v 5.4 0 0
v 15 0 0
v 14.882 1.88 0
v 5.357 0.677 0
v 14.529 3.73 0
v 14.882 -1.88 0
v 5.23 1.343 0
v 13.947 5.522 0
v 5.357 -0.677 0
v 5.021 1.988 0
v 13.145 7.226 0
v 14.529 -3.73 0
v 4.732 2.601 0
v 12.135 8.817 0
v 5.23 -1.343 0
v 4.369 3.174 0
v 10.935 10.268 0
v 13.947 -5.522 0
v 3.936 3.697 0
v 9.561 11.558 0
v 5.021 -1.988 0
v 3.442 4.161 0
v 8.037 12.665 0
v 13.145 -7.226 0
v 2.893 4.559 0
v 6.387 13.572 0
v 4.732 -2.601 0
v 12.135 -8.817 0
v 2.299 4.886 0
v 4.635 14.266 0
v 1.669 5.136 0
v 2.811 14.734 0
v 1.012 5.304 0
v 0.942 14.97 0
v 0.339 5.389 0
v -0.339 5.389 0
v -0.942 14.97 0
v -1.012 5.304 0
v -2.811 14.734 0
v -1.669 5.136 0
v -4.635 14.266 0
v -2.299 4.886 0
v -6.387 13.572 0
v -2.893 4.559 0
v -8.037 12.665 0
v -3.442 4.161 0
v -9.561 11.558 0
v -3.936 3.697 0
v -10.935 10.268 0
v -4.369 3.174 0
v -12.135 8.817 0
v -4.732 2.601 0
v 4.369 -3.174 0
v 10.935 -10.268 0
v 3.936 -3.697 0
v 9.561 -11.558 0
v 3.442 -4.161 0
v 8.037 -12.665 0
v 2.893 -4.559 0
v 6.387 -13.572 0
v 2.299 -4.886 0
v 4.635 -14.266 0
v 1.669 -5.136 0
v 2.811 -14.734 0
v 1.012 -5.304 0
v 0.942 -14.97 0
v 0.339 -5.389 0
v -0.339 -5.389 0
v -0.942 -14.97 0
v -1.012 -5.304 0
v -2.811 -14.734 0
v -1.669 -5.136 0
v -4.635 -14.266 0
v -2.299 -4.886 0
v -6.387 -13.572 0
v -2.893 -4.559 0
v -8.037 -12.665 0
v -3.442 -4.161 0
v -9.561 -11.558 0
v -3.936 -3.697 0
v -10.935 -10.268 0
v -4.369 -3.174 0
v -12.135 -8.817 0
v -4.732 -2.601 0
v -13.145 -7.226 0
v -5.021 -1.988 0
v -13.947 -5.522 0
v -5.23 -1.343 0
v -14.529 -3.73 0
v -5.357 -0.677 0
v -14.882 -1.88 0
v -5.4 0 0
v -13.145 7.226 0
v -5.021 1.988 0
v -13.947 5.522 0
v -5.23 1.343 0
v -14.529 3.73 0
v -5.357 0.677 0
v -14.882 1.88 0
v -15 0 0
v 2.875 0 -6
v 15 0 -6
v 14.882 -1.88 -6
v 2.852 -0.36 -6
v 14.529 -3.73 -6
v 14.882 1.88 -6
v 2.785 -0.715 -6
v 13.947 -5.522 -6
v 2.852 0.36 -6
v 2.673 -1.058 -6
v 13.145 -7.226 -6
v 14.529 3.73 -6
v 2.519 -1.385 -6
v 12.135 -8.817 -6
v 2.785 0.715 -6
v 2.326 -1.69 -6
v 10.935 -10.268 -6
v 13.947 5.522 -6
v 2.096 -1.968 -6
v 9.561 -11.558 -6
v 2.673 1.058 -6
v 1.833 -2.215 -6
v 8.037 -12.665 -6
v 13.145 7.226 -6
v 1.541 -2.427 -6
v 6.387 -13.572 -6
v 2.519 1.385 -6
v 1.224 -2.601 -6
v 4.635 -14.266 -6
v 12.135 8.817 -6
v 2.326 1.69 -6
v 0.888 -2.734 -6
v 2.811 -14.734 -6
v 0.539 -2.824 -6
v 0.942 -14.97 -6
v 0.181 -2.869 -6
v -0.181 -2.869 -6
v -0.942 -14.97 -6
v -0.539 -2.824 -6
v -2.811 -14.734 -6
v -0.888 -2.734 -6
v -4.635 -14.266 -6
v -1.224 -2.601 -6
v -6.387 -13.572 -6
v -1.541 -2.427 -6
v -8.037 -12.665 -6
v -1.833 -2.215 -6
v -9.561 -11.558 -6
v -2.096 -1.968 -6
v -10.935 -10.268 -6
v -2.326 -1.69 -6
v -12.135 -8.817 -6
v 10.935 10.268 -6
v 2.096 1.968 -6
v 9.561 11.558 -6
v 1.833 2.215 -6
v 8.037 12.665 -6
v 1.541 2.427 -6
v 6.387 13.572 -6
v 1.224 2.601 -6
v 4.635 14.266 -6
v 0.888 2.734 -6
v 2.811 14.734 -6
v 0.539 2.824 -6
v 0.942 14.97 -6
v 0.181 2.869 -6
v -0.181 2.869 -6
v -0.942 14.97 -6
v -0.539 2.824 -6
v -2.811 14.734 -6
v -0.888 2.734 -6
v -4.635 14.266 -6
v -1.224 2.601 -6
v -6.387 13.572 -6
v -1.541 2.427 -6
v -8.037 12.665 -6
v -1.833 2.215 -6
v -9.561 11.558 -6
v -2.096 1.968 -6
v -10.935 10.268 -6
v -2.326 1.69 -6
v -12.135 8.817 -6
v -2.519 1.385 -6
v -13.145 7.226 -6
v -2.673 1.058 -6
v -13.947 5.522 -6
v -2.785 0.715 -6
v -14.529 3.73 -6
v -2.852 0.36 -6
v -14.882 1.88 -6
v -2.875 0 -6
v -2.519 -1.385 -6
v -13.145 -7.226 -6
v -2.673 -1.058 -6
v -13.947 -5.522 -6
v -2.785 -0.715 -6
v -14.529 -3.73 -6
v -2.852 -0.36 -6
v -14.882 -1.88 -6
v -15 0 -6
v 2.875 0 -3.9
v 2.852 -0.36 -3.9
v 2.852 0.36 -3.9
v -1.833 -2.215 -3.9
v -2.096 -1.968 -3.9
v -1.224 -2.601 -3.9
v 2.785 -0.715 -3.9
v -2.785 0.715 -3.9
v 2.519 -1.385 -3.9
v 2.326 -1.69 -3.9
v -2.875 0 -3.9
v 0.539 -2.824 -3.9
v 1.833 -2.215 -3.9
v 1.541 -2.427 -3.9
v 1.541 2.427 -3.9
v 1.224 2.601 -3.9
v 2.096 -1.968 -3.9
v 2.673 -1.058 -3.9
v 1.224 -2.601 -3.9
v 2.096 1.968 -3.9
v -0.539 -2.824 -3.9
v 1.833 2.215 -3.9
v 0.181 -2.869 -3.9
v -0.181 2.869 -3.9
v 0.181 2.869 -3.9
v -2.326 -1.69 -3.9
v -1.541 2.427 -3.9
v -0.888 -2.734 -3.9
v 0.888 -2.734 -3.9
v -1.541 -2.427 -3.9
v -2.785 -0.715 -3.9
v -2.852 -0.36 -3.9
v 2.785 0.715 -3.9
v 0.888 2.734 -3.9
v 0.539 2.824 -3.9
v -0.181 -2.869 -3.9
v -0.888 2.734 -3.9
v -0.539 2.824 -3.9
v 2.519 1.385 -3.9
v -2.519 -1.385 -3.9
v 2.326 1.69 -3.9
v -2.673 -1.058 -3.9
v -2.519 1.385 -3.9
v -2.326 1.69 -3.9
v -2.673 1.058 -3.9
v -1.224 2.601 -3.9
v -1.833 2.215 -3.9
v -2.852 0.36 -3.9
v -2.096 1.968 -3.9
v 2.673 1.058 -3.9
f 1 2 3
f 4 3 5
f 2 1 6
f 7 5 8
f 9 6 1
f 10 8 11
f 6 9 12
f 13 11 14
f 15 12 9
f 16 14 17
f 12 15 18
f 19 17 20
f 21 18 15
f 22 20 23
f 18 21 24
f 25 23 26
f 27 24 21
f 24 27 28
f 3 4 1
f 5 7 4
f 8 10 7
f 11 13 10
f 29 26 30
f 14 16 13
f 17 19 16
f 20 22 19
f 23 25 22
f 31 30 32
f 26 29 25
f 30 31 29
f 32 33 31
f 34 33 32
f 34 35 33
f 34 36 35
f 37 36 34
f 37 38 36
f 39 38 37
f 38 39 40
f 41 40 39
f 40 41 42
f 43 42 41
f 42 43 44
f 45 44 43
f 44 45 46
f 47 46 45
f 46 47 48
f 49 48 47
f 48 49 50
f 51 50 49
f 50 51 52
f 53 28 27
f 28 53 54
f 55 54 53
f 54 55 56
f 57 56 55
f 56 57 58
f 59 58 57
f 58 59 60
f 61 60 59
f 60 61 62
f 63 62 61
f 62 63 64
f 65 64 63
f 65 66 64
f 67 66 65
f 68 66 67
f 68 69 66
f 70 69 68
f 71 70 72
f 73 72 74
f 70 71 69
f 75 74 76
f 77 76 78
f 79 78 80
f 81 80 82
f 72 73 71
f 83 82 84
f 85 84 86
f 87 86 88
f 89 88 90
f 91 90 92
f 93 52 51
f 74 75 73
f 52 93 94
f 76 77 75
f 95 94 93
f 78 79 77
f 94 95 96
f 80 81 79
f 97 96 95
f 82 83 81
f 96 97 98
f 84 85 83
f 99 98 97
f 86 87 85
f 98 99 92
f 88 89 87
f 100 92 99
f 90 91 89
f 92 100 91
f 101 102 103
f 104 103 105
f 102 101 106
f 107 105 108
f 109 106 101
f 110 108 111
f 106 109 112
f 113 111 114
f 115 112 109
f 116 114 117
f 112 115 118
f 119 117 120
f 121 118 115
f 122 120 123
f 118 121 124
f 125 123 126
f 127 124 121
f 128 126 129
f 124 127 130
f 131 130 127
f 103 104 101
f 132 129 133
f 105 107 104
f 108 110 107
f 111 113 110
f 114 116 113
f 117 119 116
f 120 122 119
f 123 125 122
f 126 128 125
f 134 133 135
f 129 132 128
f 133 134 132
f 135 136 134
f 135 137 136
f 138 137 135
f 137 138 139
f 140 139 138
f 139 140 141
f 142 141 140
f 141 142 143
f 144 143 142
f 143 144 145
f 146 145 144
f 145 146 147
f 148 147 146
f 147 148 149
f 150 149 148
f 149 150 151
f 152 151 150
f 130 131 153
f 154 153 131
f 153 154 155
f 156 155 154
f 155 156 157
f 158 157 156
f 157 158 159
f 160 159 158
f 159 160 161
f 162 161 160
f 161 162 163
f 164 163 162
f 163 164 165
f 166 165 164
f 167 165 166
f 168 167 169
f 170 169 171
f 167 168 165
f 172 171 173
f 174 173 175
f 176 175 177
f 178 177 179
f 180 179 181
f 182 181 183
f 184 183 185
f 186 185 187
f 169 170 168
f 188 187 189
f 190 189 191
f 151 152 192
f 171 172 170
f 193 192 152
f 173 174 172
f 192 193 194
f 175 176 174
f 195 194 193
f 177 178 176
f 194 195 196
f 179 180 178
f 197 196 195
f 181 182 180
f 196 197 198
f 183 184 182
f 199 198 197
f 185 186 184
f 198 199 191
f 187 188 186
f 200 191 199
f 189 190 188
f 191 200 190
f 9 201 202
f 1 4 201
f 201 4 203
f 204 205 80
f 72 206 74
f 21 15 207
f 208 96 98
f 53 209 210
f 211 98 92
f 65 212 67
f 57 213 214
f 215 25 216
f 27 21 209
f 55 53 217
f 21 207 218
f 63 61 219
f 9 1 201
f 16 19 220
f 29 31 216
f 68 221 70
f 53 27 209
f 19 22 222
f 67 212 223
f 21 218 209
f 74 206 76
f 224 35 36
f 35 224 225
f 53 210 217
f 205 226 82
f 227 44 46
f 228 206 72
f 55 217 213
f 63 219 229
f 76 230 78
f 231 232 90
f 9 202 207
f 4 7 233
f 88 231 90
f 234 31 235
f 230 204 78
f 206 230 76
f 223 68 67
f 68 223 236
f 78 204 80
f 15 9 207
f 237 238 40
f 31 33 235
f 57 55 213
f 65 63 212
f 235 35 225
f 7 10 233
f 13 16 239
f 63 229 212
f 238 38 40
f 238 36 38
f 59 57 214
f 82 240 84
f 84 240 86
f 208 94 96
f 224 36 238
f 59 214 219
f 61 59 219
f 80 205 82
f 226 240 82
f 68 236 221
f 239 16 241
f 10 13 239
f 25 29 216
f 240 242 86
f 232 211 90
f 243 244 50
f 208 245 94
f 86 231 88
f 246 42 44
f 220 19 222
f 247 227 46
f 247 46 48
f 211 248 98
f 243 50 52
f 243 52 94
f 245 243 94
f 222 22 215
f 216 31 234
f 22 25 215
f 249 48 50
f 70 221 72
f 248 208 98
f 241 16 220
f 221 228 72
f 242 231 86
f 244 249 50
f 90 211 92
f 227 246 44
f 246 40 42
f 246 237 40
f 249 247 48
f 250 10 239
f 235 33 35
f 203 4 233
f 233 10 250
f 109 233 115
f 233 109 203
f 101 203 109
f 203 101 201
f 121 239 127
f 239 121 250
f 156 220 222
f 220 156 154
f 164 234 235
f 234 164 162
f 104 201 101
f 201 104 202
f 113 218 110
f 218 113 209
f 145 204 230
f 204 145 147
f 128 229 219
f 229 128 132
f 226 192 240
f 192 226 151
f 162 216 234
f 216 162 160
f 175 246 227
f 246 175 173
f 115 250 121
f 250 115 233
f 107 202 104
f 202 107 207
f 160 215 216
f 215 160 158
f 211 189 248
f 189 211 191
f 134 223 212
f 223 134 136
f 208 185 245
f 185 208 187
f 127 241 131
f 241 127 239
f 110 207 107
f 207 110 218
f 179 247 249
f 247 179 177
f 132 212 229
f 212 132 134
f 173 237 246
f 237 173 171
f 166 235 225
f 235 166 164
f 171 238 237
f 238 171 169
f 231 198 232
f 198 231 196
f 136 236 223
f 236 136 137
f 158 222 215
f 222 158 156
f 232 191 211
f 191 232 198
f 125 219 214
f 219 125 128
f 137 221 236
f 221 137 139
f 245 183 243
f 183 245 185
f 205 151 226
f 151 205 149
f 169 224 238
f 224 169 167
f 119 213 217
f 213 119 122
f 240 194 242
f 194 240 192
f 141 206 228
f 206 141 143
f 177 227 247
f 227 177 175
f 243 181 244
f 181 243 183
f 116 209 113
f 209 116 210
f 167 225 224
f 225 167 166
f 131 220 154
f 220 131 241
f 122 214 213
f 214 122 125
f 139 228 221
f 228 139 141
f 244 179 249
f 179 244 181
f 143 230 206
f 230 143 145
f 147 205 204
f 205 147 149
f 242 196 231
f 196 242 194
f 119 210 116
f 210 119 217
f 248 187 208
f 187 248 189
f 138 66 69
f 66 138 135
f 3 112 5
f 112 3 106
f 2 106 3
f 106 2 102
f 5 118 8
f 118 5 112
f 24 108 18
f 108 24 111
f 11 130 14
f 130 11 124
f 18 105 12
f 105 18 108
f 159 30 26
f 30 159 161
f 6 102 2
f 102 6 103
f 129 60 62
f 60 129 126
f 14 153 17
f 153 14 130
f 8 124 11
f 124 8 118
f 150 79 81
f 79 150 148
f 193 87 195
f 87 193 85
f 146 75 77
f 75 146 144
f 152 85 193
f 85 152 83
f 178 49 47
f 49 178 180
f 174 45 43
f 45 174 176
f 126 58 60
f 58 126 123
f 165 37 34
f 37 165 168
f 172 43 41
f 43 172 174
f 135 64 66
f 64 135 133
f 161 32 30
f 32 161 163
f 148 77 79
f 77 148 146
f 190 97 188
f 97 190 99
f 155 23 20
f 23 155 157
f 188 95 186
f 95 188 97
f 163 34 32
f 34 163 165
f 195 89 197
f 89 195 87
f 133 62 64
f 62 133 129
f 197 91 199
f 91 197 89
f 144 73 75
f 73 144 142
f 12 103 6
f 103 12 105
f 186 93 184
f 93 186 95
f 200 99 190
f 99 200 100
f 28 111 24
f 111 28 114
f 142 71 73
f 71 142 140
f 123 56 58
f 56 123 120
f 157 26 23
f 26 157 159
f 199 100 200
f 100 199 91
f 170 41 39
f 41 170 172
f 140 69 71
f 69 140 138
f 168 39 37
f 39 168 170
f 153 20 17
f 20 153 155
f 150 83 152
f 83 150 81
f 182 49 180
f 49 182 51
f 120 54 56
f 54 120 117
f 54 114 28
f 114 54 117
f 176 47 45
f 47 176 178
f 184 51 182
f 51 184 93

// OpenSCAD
$fn = 50;


difference() {
	union() {
		translate(v = [0, 0, -6.0000000000]) {
			cylinder(h = 6, r = 15.0000000000);
		}
	}
	union() {
		translate(v = [0, 0, 0]) {
			rotate(a = [0, 0, 0]) {
				difference() {
					union() {
						translate(v = [0, 0, -6.0000000000]) {
							cylinder(h = 6, r = 2.6000000000);
						}
						translate(v = [0, 0, -3.9000000000]) {
							cylinder(h = 3.9000000000, r1 = 2.8750000000, r2 = 5.4000000000);
						}
						translate(v = [0, 0, -6.0000000000]) {
							cylinder(h = 6, r = 2.8750000000);
						}
						translate(v = [0, 0, -6.0000000000]) {
							cylinder(h = 6, r = 2.6000000000);
						}
					}
					union();
				}
			}
		}
	}
}
